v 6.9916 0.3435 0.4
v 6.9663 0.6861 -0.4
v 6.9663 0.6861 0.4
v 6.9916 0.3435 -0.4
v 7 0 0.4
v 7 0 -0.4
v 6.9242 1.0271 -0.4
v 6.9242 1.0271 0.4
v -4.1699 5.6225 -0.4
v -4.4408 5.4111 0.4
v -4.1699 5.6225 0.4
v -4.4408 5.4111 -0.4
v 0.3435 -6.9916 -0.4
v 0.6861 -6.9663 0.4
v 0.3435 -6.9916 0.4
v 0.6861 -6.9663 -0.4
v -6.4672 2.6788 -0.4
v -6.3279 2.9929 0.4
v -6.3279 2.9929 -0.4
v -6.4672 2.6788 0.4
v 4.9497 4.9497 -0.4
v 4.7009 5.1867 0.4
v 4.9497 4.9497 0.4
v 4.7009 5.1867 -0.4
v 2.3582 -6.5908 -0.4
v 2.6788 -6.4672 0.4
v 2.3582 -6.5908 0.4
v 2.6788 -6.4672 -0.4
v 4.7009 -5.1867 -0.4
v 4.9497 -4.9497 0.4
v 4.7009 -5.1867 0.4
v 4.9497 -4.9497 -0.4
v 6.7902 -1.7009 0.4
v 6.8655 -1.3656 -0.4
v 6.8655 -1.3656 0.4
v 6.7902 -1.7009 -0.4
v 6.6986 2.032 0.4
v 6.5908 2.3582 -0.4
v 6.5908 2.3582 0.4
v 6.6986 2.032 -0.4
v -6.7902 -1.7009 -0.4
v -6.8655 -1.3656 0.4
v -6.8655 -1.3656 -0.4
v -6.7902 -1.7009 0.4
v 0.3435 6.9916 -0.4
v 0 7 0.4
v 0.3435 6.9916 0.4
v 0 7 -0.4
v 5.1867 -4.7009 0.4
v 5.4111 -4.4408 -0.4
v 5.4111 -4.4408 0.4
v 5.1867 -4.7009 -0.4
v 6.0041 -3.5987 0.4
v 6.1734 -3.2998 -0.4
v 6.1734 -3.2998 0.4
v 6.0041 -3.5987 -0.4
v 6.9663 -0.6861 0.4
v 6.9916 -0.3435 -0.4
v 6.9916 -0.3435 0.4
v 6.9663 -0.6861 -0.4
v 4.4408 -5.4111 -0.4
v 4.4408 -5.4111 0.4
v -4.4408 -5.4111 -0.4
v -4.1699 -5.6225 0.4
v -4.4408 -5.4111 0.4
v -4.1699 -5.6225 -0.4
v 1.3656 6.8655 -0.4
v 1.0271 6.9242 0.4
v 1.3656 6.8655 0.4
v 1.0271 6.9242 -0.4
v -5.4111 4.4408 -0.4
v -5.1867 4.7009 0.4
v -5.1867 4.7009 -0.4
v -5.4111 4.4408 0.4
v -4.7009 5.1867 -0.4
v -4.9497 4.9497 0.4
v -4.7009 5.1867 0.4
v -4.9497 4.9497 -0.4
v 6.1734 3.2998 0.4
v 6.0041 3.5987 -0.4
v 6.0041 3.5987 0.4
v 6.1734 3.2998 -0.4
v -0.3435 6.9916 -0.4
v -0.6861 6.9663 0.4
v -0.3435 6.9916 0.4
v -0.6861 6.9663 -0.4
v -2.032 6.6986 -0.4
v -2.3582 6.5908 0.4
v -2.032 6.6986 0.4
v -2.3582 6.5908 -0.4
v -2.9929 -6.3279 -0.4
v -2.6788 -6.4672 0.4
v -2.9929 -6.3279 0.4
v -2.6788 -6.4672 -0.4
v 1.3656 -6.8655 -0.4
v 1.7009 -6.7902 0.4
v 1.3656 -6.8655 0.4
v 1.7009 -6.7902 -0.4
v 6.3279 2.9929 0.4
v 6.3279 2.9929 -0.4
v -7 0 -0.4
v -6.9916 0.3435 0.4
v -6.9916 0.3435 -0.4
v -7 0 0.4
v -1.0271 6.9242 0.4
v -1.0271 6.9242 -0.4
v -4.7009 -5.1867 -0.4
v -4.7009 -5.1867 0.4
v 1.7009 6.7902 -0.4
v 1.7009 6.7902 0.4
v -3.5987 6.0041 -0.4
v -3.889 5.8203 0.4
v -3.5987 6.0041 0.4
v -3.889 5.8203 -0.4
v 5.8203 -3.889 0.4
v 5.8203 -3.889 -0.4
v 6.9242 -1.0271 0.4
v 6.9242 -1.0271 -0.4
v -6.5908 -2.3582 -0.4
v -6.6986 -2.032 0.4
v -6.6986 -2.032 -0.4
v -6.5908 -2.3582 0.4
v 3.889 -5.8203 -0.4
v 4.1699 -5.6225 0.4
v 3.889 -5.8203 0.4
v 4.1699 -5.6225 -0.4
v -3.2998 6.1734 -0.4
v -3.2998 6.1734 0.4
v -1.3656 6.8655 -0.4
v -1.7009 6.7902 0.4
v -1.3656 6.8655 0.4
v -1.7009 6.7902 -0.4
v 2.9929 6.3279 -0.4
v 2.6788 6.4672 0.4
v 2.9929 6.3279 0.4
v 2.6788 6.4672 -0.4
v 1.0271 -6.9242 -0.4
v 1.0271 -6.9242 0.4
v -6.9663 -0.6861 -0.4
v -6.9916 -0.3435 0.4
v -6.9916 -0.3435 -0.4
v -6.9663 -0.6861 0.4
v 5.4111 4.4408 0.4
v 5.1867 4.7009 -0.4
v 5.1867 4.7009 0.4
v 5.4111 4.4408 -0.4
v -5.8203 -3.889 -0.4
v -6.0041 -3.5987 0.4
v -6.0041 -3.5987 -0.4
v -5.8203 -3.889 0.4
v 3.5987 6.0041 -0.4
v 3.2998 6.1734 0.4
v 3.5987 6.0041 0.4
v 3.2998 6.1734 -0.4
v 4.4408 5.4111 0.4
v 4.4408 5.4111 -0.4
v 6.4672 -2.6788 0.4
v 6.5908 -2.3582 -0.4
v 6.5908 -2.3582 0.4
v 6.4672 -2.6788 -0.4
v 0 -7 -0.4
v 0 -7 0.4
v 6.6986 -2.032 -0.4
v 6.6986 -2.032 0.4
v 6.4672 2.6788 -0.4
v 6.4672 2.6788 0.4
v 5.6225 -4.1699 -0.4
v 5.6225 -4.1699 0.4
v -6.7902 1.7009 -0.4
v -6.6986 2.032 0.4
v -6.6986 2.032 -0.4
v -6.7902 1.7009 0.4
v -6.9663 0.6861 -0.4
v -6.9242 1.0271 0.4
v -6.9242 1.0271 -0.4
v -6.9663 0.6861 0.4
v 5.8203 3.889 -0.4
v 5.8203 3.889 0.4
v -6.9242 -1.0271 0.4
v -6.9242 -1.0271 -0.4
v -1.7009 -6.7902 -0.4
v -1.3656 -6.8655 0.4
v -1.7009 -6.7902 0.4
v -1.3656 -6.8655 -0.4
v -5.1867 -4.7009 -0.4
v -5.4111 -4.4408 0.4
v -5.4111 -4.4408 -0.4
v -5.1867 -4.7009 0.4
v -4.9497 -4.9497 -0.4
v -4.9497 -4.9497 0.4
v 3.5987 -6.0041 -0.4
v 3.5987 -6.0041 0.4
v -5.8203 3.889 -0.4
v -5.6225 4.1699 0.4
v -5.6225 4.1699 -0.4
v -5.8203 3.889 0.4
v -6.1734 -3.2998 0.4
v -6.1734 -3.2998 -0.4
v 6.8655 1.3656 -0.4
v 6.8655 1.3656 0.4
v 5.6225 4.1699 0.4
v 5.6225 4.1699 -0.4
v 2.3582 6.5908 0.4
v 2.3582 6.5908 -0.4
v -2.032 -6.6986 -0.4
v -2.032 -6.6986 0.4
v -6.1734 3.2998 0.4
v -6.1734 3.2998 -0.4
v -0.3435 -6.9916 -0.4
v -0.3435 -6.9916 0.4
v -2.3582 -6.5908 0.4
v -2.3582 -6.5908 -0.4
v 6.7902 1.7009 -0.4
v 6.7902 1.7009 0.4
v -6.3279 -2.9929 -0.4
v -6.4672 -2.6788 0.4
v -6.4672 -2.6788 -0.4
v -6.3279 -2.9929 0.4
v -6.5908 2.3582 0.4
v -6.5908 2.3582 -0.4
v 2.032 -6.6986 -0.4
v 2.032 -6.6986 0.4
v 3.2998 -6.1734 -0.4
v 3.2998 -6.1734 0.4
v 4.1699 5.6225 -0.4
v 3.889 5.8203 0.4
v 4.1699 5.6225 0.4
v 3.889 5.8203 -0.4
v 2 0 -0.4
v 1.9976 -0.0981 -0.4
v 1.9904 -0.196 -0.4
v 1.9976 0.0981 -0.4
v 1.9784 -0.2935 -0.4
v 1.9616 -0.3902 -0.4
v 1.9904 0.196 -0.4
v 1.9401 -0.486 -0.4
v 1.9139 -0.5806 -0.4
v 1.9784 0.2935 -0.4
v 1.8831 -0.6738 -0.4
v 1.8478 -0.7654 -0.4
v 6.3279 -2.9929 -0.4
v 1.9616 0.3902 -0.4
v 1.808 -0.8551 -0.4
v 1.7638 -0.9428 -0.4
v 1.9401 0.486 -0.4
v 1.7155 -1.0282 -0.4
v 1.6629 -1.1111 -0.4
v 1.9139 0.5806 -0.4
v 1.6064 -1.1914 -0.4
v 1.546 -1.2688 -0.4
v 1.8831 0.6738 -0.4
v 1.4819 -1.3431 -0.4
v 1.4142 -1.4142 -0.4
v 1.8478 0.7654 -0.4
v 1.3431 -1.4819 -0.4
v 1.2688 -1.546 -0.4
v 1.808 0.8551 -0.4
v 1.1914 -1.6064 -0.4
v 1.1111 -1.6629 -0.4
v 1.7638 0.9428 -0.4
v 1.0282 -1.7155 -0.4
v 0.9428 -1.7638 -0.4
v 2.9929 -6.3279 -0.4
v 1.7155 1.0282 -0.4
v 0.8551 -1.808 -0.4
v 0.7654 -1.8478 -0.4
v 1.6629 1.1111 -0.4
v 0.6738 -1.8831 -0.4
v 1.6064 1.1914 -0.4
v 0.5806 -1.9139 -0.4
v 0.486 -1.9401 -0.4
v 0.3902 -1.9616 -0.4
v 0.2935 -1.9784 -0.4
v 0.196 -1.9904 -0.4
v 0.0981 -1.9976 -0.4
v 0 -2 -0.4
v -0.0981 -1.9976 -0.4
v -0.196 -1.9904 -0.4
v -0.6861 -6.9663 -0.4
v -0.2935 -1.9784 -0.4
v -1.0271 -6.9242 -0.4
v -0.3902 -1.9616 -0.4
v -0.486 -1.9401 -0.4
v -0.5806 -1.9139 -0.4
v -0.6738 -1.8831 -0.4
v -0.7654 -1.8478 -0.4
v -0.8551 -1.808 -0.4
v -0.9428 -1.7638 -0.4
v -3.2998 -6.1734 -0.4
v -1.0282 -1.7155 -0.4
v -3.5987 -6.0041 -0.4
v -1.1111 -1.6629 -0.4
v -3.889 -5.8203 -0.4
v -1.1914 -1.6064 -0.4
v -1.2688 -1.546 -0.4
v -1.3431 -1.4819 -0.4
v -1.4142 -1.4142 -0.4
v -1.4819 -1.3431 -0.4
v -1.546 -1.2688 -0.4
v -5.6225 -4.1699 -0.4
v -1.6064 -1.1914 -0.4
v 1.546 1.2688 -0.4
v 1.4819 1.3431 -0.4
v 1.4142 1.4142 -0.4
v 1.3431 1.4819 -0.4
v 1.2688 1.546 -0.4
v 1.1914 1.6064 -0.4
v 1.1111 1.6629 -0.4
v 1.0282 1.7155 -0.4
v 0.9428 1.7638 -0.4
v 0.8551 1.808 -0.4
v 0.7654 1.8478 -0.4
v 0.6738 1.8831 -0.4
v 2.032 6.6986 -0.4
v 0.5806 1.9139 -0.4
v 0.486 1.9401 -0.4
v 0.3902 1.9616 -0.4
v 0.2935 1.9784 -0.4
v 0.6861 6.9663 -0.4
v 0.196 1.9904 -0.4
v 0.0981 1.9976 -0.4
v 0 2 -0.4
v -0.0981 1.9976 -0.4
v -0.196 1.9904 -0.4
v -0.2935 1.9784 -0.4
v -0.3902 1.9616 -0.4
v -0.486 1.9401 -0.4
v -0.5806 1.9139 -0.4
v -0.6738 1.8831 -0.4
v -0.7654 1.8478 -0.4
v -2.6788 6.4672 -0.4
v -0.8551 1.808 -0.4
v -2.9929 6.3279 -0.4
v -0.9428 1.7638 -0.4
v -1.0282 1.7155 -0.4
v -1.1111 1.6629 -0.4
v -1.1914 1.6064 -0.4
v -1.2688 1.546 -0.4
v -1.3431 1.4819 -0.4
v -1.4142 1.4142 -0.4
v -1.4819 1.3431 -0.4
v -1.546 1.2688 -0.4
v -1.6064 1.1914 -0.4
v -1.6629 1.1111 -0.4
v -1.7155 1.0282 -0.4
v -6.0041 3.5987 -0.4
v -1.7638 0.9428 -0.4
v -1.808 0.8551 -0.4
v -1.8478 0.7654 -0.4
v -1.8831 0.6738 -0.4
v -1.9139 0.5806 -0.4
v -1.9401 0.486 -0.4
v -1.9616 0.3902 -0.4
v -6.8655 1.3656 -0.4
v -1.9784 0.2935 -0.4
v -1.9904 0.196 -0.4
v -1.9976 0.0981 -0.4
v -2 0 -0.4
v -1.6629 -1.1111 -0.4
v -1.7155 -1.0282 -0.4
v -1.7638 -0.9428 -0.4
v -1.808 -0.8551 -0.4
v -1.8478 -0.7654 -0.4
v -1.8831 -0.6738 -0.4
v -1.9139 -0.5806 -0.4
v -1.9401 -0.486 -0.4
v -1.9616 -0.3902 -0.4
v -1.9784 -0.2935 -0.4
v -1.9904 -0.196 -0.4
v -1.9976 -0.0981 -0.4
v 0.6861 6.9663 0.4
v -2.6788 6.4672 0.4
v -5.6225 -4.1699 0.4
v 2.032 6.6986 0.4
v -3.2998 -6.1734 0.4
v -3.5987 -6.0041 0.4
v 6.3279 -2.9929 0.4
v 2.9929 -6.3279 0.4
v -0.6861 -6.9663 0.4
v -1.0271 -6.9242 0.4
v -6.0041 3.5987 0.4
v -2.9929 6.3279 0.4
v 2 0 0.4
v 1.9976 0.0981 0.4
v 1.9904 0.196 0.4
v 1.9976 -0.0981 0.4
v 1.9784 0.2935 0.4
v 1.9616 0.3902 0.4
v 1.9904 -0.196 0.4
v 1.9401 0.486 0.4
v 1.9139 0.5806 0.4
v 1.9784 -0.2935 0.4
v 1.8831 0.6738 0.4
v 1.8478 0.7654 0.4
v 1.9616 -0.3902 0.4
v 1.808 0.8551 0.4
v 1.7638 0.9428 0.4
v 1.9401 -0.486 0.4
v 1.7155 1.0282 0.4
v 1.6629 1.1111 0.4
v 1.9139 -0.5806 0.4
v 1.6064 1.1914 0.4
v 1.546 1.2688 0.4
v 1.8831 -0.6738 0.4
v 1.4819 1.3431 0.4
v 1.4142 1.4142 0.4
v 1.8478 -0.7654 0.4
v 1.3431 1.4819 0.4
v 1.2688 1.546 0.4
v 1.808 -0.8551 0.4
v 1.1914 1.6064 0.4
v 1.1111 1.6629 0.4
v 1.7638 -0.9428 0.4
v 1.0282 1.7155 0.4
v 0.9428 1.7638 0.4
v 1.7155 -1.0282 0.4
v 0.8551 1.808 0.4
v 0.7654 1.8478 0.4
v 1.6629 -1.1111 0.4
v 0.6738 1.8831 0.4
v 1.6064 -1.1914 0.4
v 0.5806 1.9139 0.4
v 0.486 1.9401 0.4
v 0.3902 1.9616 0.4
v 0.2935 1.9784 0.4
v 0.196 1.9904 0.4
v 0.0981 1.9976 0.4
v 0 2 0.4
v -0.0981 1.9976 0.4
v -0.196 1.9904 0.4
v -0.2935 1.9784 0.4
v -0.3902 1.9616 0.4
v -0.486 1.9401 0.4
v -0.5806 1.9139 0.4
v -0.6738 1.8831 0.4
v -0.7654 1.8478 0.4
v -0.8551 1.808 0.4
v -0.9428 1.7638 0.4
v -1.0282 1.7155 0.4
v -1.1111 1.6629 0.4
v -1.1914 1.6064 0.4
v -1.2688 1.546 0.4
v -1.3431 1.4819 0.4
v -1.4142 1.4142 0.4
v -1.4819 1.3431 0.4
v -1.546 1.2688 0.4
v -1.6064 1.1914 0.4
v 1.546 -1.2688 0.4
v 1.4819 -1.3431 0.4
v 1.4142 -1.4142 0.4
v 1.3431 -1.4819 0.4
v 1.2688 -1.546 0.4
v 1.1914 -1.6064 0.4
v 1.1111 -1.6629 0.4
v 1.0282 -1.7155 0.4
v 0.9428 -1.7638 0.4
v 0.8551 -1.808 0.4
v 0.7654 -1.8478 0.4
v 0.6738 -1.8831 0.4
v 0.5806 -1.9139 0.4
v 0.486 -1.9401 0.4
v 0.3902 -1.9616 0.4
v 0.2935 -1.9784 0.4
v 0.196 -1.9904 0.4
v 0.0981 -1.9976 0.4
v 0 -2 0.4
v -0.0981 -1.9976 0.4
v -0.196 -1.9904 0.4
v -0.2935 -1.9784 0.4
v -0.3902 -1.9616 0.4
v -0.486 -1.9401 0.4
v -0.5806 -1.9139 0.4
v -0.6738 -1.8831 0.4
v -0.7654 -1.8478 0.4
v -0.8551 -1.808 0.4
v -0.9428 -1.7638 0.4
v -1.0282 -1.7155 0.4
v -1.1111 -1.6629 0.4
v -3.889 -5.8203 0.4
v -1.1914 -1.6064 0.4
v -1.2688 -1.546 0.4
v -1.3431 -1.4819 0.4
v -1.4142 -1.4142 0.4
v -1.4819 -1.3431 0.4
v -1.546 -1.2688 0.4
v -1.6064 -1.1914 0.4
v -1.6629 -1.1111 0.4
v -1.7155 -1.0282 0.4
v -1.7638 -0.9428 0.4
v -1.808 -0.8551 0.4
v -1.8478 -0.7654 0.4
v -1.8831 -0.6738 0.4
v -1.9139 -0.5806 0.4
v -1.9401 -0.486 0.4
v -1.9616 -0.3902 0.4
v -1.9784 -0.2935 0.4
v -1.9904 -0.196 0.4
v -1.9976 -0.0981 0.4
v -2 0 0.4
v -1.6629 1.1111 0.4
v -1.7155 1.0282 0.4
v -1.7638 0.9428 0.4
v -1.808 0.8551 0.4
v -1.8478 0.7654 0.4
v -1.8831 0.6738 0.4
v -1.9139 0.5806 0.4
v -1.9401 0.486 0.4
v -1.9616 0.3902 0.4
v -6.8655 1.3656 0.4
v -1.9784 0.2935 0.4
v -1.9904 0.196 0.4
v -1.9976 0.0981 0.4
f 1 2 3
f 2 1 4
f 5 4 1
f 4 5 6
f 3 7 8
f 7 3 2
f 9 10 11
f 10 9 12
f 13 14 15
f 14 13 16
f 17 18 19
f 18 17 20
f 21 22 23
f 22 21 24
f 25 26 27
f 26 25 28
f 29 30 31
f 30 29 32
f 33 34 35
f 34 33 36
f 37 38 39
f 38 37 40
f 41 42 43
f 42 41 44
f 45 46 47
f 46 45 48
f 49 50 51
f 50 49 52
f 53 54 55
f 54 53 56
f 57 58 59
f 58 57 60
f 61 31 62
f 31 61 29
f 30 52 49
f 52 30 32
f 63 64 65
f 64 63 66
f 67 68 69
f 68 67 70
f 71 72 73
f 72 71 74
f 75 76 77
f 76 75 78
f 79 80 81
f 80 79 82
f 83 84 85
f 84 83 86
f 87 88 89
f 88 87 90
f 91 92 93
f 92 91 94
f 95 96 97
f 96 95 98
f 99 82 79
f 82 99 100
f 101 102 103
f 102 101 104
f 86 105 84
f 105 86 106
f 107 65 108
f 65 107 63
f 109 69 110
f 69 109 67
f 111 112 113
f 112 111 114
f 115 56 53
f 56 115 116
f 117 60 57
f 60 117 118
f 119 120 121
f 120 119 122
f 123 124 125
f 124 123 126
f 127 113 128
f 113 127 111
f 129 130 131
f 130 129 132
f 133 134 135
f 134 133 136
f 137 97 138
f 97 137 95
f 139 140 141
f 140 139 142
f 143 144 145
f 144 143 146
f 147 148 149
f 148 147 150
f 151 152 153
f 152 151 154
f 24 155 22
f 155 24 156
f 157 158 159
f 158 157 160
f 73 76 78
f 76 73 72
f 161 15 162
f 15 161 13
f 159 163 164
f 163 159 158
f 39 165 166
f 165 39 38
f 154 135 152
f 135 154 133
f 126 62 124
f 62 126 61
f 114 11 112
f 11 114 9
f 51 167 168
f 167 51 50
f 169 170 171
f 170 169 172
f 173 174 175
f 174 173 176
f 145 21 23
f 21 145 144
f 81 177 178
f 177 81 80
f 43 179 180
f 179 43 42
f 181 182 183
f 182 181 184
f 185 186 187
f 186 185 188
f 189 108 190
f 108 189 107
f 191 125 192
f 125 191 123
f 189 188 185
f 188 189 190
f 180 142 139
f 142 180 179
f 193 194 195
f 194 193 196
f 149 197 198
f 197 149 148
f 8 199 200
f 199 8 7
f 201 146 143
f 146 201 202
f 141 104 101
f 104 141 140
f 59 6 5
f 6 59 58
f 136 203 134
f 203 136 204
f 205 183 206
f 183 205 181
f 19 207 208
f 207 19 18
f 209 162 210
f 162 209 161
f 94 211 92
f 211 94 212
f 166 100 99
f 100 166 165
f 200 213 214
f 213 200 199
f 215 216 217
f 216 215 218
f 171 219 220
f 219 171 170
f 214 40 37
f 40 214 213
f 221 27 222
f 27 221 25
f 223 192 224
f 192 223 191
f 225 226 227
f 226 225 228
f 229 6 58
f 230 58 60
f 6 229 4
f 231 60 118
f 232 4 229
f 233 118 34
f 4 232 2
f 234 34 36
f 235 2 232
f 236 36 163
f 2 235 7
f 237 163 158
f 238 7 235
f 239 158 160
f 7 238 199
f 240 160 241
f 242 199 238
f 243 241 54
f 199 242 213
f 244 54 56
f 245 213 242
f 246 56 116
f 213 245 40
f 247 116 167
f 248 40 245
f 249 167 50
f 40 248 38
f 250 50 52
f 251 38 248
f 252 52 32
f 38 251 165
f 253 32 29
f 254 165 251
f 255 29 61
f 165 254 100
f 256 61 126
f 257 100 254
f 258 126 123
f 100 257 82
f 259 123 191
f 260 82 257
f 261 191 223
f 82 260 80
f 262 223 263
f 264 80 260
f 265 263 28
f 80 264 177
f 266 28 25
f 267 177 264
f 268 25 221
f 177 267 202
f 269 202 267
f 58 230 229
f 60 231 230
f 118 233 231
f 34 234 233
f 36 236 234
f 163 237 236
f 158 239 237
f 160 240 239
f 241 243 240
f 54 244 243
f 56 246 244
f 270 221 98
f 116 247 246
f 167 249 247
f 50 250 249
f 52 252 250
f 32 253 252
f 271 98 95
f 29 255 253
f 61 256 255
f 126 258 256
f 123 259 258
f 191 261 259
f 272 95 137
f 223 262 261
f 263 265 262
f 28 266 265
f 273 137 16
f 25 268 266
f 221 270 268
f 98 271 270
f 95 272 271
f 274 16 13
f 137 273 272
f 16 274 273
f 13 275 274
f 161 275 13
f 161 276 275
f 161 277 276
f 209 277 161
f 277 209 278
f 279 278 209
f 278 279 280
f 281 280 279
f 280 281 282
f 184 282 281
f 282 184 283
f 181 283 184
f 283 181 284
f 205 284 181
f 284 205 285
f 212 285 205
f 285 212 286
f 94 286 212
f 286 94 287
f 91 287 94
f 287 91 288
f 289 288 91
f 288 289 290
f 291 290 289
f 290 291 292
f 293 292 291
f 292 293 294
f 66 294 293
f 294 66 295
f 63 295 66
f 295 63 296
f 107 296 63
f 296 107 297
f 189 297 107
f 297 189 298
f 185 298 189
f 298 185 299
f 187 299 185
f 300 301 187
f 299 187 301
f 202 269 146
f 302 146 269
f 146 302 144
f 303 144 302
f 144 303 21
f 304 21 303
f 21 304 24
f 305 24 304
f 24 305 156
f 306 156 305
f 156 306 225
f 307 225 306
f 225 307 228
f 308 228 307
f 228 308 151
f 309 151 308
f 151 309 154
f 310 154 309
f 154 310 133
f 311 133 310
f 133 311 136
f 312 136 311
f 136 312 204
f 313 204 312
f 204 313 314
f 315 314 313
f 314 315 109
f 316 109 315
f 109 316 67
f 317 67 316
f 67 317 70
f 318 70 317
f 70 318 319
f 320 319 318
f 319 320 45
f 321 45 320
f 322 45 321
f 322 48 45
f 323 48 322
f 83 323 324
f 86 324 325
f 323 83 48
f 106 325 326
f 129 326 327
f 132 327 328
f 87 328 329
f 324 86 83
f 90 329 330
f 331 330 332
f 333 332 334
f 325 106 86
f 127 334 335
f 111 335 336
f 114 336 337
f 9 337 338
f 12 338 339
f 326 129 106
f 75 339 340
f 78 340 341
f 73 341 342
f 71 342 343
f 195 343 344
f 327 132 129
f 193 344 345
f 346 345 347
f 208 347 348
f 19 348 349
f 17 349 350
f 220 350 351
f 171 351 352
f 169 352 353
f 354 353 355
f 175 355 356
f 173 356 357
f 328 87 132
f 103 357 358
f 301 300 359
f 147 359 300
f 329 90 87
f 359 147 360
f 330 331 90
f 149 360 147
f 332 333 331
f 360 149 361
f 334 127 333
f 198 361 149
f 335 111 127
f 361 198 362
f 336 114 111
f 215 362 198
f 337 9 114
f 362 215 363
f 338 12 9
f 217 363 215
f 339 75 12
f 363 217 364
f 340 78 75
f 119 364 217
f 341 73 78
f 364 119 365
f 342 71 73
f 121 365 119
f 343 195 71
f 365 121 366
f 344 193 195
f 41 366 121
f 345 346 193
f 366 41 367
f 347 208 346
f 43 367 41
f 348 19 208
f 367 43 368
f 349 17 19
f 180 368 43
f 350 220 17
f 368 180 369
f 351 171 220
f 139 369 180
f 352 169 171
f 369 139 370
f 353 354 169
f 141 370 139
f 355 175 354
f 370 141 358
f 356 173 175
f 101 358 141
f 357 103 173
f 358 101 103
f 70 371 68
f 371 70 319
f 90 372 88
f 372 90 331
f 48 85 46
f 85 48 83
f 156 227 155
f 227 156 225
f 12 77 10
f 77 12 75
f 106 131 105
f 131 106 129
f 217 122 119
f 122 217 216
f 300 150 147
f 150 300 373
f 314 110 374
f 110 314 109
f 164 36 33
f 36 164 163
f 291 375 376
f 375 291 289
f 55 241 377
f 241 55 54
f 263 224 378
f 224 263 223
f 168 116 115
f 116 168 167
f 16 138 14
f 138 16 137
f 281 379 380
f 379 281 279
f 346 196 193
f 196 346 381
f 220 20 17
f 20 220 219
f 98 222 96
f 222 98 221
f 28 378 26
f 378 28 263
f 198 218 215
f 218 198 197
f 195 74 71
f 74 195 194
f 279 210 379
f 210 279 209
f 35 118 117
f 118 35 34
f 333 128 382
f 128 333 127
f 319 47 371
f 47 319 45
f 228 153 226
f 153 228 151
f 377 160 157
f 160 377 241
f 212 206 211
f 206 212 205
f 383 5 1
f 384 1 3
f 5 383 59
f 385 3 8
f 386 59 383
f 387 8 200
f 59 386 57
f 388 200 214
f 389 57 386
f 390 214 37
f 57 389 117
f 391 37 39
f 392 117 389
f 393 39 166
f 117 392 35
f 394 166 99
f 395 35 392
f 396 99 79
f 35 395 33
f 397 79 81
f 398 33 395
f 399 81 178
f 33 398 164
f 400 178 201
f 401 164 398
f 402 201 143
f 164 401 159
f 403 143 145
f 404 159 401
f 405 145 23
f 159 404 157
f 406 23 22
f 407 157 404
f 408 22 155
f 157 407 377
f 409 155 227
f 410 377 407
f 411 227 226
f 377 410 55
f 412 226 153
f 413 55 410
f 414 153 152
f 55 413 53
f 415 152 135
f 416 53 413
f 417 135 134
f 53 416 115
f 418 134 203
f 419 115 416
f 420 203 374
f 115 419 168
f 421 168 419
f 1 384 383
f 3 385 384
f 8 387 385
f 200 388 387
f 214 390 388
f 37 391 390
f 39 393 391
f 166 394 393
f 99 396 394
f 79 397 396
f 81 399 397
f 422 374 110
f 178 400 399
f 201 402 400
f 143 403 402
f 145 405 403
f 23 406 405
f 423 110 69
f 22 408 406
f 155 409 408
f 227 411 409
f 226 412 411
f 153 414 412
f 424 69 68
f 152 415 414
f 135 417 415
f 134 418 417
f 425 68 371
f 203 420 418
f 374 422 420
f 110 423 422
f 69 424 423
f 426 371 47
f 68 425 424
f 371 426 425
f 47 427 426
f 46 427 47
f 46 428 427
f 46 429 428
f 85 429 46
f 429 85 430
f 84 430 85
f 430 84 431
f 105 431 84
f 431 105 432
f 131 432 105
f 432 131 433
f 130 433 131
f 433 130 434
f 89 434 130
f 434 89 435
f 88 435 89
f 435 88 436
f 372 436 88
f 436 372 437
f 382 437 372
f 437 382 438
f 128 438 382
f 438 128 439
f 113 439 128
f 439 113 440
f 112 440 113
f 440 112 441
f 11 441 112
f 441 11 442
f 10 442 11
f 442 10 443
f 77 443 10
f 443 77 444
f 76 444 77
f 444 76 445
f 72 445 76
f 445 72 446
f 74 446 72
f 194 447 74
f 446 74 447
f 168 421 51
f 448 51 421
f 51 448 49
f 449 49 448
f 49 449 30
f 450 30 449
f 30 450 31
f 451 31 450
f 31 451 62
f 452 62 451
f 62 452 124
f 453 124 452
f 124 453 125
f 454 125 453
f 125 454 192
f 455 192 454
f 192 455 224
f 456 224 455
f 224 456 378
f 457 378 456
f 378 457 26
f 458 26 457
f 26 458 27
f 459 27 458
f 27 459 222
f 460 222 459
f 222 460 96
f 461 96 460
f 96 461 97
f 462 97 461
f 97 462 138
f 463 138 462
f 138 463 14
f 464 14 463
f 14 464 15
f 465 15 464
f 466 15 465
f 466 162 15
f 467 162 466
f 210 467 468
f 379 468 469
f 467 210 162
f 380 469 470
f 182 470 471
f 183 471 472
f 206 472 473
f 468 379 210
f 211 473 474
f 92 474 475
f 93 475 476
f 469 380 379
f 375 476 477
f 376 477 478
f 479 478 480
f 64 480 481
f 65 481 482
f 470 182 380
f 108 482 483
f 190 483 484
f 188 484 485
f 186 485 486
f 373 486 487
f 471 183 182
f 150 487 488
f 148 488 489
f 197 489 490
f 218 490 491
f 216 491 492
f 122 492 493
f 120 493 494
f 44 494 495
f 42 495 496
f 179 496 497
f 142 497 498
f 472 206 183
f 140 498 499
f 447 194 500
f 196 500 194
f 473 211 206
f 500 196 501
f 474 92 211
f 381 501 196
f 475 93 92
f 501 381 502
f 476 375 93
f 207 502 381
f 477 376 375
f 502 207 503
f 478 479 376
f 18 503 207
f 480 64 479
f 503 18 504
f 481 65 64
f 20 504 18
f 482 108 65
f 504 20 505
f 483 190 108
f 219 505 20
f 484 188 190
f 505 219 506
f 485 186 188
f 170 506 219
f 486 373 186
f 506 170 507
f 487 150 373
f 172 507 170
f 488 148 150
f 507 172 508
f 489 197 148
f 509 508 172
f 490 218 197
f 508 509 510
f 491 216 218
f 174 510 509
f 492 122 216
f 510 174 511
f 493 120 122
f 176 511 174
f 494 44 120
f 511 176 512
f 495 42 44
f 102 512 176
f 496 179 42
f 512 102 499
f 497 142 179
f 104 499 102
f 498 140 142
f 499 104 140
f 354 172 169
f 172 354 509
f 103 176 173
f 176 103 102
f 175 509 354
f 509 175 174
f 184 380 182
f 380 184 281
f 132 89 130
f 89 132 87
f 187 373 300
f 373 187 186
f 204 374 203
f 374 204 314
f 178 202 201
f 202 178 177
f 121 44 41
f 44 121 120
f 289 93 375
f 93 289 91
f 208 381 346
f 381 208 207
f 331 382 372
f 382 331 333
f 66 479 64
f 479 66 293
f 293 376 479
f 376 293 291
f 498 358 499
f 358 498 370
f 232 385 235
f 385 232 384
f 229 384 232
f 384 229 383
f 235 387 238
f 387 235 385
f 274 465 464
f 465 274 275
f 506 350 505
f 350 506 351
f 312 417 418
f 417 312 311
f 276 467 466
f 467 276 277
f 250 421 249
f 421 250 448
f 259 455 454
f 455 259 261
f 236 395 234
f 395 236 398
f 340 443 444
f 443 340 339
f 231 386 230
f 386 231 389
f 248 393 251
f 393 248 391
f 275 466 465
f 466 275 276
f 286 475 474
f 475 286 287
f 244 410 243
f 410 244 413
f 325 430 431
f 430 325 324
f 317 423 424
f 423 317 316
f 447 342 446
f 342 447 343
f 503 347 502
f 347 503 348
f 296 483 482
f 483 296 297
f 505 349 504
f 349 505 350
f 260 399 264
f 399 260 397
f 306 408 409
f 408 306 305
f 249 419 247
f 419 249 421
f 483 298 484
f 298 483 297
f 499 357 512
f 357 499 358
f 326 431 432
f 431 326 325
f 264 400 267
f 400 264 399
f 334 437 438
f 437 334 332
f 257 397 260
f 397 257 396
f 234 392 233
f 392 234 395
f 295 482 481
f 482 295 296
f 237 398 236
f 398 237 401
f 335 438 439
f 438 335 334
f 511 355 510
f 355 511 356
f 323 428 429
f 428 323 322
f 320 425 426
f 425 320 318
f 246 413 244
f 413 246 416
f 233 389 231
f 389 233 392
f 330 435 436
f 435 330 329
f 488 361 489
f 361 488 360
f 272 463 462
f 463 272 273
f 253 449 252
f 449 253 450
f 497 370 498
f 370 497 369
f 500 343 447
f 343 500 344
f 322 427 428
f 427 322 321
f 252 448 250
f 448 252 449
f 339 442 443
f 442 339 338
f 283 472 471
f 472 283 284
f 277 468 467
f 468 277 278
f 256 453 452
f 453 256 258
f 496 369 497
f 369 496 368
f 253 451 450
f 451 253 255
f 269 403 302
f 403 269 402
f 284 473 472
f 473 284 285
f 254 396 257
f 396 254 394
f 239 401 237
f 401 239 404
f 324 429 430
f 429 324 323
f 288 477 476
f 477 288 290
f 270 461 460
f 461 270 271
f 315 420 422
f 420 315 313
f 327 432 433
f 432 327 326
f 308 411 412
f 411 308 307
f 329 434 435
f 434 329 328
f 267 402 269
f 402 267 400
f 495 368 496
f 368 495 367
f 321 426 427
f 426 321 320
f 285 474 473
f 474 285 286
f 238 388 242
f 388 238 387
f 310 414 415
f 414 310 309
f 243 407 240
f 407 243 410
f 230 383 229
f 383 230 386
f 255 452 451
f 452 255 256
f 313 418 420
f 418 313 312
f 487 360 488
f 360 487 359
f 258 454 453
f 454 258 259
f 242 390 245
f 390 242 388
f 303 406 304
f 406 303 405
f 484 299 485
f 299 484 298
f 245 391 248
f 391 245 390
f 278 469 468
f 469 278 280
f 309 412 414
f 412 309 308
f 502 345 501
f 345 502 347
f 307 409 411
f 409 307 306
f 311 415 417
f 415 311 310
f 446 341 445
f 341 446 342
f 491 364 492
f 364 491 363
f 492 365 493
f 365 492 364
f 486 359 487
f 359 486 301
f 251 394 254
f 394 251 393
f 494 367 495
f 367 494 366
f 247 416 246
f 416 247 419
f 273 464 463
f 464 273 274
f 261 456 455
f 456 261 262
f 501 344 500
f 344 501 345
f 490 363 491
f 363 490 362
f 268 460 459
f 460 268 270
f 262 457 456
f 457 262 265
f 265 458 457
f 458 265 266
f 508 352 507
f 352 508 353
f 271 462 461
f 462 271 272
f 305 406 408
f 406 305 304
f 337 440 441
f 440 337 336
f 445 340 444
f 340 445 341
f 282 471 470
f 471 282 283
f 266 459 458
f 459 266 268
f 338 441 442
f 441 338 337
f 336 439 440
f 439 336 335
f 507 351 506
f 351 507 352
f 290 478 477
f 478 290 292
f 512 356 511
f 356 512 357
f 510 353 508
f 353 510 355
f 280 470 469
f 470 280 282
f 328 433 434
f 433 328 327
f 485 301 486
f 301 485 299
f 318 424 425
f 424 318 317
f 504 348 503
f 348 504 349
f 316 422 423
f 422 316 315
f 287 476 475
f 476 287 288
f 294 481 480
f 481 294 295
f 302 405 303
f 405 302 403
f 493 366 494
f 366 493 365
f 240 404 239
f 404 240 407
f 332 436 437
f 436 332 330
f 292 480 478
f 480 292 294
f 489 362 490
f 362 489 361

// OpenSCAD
$fn=128;

module penny_washer(id=4.0, od=14.0, thickness=0.8) {
    difference() {
        cylinder(h=thickness, d=od, center=true);
        cylinder(h=thickness+0.2, d=id, center=true);
    }
}

penny_washer();
